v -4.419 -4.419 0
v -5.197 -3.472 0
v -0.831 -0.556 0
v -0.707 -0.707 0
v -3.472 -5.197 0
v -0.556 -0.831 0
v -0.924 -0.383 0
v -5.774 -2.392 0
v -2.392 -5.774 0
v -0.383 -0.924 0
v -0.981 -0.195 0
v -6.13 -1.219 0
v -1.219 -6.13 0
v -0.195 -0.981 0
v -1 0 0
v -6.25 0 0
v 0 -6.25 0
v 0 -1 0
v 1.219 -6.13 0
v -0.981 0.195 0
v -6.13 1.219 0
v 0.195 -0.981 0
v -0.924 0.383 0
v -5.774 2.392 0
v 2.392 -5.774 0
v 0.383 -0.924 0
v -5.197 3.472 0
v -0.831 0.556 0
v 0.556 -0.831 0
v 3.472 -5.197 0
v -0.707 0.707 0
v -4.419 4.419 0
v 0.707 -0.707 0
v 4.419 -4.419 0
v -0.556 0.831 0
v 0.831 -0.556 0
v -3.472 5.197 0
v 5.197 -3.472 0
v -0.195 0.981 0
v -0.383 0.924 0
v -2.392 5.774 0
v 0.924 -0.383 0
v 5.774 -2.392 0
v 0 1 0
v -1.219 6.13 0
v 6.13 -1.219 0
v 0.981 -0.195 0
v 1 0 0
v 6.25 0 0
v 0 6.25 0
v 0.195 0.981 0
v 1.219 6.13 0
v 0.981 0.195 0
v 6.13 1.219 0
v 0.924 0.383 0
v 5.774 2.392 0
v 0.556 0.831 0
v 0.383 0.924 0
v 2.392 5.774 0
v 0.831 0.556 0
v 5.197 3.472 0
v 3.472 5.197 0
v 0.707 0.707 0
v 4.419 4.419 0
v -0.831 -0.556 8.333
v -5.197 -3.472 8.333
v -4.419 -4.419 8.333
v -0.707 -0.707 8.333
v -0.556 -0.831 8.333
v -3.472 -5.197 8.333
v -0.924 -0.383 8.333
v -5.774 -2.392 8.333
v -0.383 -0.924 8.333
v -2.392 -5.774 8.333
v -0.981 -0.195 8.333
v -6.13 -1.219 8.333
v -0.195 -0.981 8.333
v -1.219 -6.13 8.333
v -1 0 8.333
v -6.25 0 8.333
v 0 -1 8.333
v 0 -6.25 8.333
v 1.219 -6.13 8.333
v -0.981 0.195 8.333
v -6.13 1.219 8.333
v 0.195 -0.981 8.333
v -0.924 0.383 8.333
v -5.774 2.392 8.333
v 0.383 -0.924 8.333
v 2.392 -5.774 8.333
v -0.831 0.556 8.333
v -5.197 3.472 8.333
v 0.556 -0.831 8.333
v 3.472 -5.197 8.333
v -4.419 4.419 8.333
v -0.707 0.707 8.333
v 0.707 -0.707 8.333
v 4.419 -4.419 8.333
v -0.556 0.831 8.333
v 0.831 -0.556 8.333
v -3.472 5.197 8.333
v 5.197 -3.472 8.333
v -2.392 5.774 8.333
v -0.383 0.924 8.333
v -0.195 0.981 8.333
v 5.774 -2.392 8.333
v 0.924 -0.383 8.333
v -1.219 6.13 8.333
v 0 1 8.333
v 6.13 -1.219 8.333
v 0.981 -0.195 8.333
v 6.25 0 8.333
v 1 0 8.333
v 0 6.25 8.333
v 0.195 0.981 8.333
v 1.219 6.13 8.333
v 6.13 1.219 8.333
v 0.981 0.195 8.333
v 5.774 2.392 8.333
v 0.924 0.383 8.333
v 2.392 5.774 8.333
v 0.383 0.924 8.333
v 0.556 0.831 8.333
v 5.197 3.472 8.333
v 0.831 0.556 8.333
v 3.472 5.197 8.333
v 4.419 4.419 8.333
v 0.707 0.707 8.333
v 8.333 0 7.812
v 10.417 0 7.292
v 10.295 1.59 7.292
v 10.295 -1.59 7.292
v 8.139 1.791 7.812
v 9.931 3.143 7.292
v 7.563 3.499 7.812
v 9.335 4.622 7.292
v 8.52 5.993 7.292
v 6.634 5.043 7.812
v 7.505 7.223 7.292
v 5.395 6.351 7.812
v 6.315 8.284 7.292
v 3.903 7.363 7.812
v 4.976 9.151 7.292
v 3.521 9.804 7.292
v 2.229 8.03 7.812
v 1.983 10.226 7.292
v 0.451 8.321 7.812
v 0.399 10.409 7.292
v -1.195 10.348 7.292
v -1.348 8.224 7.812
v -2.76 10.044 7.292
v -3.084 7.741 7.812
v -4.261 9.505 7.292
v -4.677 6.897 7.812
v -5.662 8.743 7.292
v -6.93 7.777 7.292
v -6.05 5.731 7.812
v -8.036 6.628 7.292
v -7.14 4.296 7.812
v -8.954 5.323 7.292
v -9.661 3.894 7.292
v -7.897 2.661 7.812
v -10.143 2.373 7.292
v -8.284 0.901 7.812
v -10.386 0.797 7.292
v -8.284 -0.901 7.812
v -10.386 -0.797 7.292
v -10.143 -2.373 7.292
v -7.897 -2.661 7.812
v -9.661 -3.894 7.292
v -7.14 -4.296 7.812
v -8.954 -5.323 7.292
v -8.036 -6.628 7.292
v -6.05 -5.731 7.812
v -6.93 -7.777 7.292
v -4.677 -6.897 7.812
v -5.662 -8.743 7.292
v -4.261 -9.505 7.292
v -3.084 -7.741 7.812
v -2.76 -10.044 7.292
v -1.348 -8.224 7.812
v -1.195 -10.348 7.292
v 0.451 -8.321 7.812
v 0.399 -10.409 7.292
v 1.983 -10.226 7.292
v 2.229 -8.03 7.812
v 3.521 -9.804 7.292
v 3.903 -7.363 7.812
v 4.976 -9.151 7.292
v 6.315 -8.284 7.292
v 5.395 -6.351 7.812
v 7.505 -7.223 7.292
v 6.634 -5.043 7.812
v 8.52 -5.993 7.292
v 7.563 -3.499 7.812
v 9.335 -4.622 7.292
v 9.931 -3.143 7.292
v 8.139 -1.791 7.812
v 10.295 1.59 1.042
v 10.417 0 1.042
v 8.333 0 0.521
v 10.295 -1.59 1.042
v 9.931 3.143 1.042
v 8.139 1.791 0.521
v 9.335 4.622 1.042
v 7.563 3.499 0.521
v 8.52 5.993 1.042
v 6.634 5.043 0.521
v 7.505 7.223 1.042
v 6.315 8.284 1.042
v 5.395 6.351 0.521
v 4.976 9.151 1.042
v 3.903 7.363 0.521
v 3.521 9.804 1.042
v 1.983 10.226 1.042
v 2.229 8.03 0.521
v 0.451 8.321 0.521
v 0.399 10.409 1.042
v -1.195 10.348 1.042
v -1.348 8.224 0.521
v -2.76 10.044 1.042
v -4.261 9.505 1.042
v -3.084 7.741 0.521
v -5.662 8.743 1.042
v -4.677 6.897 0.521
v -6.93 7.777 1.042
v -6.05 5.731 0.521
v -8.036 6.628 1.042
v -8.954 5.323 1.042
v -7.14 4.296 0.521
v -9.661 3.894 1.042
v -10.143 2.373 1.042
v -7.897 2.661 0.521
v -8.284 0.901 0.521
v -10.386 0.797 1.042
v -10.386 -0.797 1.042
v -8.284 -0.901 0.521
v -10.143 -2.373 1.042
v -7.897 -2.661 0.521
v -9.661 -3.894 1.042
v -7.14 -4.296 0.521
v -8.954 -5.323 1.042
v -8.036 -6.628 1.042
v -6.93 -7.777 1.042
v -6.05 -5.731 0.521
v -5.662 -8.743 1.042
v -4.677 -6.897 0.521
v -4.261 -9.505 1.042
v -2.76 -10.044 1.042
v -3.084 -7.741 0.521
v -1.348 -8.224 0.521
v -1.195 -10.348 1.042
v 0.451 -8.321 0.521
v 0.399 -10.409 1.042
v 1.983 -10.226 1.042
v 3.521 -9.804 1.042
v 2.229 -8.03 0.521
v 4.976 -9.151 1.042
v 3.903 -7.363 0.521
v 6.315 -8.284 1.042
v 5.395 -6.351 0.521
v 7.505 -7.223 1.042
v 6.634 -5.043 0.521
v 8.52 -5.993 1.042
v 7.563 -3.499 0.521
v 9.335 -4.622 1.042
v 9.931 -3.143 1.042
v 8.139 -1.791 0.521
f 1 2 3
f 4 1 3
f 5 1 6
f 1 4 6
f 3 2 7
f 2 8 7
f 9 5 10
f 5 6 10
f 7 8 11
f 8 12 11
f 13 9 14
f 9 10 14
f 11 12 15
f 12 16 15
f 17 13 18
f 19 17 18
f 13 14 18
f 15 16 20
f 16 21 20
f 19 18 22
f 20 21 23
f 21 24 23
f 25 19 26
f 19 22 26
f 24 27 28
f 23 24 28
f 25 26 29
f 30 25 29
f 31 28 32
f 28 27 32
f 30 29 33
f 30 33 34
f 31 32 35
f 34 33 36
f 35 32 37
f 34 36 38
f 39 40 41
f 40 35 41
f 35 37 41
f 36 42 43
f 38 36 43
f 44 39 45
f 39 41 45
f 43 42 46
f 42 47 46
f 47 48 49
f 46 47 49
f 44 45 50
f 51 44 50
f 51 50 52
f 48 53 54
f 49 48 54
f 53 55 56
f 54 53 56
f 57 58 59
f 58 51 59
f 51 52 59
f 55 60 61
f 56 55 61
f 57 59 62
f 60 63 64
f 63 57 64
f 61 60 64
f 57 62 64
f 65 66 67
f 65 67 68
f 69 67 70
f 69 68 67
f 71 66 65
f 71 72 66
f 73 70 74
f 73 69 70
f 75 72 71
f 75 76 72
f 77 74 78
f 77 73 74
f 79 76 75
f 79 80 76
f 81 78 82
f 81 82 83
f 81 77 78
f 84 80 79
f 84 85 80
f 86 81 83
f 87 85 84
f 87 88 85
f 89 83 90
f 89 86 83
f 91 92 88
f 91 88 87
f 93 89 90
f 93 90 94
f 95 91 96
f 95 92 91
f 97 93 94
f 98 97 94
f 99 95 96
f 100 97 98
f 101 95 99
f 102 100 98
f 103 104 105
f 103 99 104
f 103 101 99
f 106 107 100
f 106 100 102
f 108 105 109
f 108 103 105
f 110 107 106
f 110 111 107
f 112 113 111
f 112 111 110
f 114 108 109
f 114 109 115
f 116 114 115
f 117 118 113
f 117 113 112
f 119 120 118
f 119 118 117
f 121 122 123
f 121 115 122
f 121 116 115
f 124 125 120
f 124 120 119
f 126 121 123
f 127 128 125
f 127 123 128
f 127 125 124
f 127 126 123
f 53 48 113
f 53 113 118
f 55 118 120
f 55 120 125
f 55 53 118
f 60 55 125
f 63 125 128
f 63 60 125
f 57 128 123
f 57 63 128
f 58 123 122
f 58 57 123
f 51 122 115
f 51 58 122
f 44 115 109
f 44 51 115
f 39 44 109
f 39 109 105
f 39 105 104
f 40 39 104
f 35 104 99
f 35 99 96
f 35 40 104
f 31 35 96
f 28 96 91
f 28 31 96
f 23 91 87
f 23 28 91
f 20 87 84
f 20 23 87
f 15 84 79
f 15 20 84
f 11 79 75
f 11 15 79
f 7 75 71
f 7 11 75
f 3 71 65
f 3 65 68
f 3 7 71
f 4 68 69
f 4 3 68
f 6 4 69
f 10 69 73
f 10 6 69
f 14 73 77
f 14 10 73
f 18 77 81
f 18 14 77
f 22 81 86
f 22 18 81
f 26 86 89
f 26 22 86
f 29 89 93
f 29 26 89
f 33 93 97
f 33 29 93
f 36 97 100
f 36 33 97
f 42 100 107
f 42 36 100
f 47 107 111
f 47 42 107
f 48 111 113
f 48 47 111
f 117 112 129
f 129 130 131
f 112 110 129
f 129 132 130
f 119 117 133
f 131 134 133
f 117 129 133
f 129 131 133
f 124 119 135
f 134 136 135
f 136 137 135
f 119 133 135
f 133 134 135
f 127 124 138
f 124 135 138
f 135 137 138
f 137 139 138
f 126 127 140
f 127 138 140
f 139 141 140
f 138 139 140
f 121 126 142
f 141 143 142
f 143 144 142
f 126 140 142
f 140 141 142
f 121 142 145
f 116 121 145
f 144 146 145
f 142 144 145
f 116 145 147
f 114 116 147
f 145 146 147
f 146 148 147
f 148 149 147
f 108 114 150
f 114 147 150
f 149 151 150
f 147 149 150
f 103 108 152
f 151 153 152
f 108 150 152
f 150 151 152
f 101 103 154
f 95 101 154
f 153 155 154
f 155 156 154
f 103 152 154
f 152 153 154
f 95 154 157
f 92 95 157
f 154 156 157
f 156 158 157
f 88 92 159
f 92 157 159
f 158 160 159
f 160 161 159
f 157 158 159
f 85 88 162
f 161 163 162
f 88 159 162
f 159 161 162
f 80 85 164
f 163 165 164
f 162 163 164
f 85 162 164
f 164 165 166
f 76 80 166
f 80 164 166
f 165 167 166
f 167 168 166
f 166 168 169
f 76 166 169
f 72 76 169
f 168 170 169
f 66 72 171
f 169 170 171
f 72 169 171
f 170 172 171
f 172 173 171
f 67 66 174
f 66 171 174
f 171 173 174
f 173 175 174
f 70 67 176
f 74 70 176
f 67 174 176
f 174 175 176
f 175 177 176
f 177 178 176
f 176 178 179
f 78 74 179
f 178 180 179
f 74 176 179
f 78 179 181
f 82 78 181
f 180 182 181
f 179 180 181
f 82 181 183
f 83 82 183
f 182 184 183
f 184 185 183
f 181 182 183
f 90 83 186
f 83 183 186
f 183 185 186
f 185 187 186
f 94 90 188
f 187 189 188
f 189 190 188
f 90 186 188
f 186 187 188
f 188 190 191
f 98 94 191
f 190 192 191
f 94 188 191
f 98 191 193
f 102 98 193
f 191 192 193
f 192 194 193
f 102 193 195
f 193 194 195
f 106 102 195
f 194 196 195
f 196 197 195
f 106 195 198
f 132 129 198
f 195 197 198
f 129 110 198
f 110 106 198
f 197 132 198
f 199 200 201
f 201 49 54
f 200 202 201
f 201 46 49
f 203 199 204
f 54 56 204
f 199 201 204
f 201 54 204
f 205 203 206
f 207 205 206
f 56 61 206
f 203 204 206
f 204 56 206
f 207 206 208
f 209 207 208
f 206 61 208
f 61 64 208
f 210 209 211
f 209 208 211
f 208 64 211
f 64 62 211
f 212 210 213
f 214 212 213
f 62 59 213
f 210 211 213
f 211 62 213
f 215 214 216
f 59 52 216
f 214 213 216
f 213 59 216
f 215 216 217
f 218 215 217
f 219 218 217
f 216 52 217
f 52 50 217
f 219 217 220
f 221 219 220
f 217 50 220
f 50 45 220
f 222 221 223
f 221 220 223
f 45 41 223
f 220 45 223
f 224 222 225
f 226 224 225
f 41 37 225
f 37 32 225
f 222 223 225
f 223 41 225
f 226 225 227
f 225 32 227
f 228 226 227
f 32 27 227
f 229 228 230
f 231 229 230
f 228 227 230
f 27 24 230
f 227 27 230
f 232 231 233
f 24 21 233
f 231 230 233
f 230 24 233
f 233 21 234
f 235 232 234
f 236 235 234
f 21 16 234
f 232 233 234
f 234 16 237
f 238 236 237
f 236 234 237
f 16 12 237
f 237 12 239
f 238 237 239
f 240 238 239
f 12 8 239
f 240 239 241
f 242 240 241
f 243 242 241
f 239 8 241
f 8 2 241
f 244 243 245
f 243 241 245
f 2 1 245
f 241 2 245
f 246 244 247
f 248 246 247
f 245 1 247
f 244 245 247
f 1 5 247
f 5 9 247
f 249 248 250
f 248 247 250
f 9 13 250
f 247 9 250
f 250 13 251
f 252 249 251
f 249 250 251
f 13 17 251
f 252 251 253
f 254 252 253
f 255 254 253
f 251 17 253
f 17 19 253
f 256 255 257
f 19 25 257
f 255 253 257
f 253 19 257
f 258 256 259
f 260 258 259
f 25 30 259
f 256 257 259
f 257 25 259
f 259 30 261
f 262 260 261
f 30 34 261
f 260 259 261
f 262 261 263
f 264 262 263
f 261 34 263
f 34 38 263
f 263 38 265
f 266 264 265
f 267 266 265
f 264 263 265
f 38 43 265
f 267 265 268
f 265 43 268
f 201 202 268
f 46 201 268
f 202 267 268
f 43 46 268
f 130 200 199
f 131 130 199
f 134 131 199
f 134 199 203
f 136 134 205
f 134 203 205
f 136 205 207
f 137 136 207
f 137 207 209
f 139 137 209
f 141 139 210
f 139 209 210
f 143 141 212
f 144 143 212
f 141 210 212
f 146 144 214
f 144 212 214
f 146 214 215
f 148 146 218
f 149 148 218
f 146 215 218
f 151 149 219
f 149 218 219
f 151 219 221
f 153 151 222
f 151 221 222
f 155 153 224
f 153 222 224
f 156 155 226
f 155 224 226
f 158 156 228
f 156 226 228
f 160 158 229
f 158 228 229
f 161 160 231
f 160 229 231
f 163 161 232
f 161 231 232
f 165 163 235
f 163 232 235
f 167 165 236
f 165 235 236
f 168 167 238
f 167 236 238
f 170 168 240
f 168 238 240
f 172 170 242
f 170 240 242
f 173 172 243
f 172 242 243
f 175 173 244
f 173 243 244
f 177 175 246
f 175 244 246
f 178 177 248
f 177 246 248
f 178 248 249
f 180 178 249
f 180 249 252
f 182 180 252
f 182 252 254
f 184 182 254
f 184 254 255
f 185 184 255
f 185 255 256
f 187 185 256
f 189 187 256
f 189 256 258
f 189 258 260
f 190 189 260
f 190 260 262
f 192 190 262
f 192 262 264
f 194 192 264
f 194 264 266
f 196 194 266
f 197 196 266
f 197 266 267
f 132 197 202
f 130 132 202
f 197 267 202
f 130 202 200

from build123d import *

# Parameters (mm, degrees)
F0_R     = 10.4166666667
F0_R_2   = 1
F1_DEPTH = 8.3333333333
F2_SIZE2 = 1.0416666667
F2_SIZE  = 4.1666666667
F3_SIZE2 = 4.1666666667
F3_SIZE  = 1.0416666667


with BuildPart() as f1:
    # F0 (on Top) → F1 (new body)
    with BuildSketch(Plane.XY):
        Circle(F0_R)
        Circle(F0_R_2, mode=Mode.SUBTRACT)
    extrude(amount=F1_DEPTH)

    # F2
    f2_edges = [f1.edges().sort_by_distance(p)[0] for p in [
        (-10.416667, 0, 8.333333),
    ]]
    f2_side = f1.faces().sort_by_distance((-10.122039, 0, 8.333333))[0]
    chamfer(f2_edges, length=F2_SIZE, length2=F2_SIZE2, reference=f2_side)

    # F3
    f3_edges = [f1.edges().sort_by_distance(p)[0] for p in [
        (-10.416667, 0, 0),
    ]]
    f3_side = f1.faces().sort_by_distance((-10.416667, 0, 3.645833))[0]
    chamfer(f3_edges, length=F3_SIZE, length2=F3_SIZE2, reference=f3_side)


solid = f1.part
